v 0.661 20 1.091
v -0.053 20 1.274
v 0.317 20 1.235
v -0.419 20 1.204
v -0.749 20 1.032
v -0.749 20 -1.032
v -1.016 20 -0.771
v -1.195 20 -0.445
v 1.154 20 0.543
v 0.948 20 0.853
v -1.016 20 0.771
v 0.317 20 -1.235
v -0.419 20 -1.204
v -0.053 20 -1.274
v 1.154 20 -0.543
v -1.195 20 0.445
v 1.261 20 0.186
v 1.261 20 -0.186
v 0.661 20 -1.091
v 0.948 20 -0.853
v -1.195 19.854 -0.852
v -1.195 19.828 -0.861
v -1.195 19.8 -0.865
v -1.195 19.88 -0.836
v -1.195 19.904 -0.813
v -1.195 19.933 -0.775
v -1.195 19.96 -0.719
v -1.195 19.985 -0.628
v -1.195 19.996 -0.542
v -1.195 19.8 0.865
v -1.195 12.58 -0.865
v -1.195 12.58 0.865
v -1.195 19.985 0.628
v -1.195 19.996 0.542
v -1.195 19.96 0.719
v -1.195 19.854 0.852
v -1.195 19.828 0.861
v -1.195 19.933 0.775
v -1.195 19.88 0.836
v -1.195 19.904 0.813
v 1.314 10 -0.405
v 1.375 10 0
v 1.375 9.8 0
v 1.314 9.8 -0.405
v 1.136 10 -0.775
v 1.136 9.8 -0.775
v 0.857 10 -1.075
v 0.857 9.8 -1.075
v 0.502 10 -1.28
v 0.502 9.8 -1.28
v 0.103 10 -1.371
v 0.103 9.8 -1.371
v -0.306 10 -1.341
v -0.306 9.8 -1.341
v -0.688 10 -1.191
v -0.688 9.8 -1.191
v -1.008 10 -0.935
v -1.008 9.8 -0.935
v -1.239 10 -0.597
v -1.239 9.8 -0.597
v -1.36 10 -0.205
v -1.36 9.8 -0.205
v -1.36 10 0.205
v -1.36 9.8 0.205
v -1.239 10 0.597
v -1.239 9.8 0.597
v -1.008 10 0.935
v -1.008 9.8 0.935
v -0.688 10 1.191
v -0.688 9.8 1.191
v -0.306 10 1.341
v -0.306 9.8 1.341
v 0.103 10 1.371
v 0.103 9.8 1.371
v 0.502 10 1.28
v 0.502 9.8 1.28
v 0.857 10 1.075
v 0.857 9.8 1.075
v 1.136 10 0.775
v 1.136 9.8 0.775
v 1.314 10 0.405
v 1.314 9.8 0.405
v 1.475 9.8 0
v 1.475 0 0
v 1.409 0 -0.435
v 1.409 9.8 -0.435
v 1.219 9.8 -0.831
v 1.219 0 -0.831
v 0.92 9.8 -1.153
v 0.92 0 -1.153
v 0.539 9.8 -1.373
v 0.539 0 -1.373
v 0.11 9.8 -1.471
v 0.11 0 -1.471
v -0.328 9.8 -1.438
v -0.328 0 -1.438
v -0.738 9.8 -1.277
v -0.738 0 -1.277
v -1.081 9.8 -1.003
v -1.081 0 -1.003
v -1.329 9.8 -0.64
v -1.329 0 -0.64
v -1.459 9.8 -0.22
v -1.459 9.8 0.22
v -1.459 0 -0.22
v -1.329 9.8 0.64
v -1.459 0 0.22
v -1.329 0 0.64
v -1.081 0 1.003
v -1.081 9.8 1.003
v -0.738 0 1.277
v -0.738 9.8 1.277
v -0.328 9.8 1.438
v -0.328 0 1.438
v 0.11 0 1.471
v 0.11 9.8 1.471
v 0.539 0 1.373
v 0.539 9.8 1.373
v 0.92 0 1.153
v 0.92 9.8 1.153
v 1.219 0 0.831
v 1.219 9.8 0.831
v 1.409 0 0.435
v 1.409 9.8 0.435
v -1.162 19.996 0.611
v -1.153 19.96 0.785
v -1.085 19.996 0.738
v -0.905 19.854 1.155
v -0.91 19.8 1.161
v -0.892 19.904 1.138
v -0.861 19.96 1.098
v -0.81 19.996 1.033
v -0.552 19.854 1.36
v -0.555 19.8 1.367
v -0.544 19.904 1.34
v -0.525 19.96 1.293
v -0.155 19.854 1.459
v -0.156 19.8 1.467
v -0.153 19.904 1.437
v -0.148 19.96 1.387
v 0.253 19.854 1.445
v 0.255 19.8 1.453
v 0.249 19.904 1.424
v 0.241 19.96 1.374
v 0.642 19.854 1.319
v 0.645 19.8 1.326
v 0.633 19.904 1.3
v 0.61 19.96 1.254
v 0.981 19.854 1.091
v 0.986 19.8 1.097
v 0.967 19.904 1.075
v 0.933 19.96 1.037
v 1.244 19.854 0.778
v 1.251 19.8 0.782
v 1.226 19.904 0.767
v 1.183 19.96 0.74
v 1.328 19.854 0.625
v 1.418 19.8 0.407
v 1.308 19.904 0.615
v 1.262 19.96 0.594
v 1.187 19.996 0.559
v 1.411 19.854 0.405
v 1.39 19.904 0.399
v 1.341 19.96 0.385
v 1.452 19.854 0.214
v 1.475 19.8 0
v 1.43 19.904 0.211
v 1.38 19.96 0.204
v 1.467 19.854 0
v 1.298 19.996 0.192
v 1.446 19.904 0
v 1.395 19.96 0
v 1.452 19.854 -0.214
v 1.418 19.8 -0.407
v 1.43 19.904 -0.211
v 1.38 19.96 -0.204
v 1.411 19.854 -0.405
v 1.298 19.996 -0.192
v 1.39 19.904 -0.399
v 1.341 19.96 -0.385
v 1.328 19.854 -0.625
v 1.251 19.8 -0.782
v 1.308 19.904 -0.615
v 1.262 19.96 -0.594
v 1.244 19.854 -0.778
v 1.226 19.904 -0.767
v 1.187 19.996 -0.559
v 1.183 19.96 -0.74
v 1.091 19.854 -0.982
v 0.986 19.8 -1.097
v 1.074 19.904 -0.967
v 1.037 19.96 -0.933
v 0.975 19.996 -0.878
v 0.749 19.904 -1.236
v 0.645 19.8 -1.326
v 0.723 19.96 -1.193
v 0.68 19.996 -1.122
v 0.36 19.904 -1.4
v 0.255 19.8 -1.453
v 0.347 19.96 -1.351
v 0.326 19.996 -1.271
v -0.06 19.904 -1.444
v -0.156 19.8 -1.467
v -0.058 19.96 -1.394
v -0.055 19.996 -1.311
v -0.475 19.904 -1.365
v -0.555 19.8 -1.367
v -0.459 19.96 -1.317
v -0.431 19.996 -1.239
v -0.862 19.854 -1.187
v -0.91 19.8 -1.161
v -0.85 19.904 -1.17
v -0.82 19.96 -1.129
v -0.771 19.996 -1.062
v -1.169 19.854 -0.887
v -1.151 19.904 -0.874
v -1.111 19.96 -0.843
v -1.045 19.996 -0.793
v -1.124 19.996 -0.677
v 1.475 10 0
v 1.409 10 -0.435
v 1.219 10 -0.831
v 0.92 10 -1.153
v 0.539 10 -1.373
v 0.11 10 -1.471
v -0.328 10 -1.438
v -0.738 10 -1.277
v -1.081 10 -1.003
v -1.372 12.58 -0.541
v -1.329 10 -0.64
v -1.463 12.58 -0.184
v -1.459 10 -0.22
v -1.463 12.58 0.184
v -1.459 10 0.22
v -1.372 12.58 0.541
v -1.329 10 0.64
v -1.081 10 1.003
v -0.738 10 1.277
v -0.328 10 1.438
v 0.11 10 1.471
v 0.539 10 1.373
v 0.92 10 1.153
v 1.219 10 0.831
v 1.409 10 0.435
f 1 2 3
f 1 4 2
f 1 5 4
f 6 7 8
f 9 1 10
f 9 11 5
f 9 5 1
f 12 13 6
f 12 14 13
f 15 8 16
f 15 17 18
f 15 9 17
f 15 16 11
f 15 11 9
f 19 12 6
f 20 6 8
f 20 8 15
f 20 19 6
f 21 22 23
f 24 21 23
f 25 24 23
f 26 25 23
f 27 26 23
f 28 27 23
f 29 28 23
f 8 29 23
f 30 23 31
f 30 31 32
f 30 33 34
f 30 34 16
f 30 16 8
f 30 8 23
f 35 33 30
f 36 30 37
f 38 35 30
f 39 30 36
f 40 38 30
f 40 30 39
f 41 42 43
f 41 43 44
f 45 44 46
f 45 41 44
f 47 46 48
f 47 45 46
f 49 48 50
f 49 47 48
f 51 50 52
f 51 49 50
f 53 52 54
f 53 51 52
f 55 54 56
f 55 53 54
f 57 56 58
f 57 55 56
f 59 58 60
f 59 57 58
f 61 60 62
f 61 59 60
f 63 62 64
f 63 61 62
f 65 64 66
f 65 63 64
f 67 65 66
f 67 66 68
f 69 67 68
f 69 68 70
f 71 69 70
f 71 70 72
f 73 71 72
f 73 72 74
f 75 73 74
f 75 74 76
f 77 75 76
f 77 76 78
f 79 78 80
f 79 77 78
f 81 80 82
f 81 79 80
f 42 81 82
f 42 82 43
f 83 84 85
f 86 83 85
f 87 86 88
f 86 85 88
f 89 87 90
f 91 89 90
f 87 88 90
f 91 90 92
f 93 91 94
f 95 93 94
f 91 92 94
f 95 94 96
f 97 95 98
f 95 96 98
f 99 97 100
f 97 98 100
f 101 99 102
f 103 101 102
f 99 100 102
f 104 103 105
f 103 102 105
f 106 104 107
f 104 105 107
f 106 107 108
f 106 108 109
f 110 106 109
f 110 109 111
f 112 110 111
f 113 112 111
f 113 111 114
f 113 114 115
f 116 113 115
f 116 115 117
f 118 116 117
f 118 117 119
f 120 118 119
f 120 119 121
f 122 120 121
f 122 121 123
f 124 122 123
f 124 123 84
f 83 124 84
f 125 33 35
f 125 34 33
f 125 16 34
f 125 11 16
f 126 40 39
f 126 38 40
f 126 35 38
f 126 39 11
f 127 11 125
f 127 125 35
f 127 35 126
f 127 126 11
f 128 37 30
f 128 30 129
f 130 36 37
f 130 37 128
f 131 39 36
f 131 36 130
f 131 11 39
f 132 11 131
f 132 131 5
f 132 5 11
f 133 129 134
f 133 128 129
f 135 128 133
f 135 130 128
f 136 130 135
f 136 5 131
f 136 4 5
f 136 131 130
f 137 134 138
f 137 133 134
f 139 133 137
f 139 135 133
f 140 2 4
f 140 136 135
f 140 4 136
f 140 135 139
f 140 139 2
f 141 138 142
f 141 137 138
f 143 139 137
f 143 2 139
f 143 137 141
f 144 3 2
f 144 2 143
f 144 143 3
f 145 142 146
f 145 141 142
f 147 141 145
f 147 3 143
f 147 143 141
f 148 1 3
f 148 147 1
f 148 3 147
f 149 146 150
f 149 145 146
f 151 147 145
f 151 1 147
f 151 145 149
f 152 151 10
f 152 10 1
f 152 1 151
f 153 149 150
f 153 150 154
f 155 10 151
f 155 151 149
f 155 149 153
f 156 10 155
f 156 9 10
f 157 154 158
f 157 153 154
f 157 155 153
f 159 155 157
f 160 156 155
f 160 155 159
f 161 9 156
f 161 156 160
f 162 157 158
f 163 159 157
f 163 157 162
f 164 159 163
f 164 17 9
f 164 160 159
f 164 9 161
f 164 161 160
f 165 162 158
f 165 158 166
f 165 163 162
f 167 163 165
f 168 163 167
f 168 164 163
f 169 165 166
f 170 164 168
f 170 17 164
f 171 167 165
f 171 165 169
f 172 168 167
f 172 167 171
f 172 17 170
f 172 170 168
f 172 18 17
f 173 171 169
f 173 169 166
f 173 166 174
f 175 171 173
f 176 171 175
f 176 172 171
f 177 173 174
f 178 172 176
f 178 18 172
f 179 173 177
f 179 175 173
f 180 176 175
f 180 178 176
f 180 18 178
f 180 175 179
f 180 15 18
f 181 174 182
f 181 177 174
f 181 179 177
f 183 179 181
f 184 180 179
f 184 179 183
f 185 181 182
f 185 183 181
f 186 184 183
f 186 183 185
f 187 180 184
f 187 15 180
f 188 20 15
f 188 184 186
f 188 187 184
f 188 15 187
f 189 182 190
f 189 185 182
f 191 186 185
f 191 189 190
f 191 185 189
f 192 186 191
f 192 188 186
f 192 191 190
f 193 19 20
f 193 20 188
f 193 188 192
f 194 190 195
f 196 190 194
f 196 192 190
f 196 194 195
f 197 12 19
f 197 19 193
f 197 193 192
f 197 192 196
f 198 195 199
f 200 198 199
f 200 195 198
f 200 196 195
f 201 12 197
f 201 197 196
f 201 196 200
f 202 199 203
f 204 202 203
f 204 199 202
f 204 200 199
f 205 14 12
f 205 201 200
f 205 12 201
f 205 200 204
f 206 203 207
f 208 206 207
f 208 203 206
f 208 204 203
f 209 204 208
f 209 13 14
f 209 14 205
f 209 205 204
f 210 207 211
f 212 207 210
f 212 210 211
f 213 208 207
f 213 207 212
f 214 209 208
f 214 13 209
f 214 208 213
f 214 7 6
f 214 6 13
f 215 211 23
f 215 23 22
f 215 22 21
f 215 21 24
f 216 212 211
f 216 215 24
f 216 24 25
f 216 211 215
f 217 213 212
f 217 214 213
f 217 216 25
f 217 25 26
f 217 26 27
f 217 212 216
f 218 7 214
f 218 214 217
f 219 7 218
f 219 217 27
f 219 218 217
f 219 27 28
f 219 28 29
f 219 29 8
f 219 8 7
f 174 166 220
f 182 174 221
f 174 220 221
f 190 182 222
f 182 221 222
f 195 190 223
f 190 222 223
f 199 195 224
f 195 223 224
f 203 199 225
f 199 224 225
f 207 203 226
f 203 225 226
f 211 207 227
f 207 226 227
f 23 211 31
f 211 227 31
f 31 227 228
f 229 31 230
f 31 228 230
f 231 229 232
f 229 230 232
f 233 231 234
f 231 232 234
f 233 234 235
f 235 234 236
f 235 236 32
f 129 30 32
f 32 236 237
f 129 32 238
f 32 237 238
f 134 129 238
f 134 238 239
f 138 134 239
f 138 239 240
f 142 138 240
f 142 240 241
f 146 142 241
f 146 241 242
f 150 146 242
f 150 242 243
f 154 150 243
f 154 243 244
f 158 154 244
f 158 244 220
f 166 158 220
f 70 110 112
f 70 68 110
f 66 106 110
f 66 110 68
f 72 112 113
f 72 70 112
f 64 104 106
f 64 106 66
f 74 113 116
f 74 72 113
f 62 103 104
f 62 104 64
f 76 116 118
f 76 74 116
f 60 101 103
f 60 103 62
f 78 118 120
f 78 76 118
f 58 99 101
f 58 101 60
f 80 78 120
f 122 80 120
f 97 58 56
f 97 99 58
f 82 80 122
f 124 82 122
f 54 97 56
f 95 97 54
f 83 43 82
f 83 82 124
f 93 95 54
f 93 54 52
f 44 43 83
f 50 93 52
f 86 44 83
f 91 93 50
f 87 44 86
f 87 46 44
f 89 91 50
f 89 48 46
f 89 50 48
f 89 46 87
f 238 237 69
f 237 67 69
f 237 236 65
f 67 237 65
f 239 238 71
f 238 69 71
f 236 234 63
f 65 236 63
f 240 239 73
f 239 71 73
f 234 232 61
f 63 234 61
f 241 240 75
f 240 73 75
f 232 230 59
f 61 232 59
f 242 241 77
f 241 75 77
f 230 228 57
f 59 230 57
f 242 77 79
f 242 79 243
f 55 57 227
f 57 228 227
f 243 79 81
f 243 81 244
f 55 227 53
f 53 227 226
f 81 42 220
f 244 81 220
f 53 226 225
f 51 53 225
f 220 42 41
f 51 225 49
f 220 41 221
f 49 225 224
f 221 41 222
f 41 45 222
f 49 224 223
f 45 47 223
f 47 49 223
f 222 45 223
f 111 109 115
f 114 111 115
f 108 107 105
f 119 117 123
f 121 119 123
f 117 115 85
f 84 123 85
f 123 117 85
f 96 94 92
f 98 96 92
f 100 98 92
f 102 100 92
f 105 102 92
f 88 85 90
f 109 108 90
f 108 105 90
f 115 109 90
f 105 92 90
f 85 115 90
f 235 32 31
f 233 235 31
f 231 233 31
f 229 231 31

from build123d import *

# Parameters (mm, degrees)
SKETCH_1_R          = 1.475
EXTRUDE_1_DEPTH     = 20
SKETCH_2_R          = 1.475
SKETCH_2_R_2        = 1.375
CUT_EXTRUDE_4_DEPTH = 0.2
CUT_EXTRUDE_1_DEPTH = 7.42
FILLET_1_R          = 0.2


with BuildPart() as part:
    # 草图1 → 凸台-拉伸1 (new body)
    with BuildSketch(Plane(origin=(0, 0, 0), x_dir=(1, 0, 0), z_dir=(0, 1, 0))):
        Circle(SKETCH_1_R)
    extrude(amount=EXTRUDE_1_DEPTH)

    # 草图2 → 切除-拉伸-薄壁4 (cut)
    with BuildSketch(Plane(origin=(0, 10, 0), x_dir=(1, 0, 0), z_dir=(0, 1, 0))):
        Circle(SKETCH_2_R)
        Circle(SKETCH_2_R_2, mode=Mode.SUBTRACT)
    extrude(amount=-CUT_EXTRUDE_4_DEPTH, mode=Mode.SUBTRACT)

    # 草图3 → 切除-拉伸1 (cut)
    with BuildSketch(Plane(origin=(0, 20, 0), x_dir=(1, 0, 0), z_dir=(0, 1, 0))):
        with BuildLine():
            Line((-1.195, 0.864638653), (-1.195, -0.864638653))
            ThreePointArc((-1.195, -0.864638653), (-1.475, 0), (-1.195, 0.864638653))
        make_face()
    extrude(amount=-CUT_EXTRUDE_1_DEPTH, mode=Mode.SUBTRACT)

    # 圆角1
    fillet_1_edges = [part.edges().sort_by_distance(p)[0] for p in [
        (0.454422711, 20, 1.403255144),
    ]]
    fillet(fillet_1_edges, radius=FILLET_1_R)


solid = part.part
